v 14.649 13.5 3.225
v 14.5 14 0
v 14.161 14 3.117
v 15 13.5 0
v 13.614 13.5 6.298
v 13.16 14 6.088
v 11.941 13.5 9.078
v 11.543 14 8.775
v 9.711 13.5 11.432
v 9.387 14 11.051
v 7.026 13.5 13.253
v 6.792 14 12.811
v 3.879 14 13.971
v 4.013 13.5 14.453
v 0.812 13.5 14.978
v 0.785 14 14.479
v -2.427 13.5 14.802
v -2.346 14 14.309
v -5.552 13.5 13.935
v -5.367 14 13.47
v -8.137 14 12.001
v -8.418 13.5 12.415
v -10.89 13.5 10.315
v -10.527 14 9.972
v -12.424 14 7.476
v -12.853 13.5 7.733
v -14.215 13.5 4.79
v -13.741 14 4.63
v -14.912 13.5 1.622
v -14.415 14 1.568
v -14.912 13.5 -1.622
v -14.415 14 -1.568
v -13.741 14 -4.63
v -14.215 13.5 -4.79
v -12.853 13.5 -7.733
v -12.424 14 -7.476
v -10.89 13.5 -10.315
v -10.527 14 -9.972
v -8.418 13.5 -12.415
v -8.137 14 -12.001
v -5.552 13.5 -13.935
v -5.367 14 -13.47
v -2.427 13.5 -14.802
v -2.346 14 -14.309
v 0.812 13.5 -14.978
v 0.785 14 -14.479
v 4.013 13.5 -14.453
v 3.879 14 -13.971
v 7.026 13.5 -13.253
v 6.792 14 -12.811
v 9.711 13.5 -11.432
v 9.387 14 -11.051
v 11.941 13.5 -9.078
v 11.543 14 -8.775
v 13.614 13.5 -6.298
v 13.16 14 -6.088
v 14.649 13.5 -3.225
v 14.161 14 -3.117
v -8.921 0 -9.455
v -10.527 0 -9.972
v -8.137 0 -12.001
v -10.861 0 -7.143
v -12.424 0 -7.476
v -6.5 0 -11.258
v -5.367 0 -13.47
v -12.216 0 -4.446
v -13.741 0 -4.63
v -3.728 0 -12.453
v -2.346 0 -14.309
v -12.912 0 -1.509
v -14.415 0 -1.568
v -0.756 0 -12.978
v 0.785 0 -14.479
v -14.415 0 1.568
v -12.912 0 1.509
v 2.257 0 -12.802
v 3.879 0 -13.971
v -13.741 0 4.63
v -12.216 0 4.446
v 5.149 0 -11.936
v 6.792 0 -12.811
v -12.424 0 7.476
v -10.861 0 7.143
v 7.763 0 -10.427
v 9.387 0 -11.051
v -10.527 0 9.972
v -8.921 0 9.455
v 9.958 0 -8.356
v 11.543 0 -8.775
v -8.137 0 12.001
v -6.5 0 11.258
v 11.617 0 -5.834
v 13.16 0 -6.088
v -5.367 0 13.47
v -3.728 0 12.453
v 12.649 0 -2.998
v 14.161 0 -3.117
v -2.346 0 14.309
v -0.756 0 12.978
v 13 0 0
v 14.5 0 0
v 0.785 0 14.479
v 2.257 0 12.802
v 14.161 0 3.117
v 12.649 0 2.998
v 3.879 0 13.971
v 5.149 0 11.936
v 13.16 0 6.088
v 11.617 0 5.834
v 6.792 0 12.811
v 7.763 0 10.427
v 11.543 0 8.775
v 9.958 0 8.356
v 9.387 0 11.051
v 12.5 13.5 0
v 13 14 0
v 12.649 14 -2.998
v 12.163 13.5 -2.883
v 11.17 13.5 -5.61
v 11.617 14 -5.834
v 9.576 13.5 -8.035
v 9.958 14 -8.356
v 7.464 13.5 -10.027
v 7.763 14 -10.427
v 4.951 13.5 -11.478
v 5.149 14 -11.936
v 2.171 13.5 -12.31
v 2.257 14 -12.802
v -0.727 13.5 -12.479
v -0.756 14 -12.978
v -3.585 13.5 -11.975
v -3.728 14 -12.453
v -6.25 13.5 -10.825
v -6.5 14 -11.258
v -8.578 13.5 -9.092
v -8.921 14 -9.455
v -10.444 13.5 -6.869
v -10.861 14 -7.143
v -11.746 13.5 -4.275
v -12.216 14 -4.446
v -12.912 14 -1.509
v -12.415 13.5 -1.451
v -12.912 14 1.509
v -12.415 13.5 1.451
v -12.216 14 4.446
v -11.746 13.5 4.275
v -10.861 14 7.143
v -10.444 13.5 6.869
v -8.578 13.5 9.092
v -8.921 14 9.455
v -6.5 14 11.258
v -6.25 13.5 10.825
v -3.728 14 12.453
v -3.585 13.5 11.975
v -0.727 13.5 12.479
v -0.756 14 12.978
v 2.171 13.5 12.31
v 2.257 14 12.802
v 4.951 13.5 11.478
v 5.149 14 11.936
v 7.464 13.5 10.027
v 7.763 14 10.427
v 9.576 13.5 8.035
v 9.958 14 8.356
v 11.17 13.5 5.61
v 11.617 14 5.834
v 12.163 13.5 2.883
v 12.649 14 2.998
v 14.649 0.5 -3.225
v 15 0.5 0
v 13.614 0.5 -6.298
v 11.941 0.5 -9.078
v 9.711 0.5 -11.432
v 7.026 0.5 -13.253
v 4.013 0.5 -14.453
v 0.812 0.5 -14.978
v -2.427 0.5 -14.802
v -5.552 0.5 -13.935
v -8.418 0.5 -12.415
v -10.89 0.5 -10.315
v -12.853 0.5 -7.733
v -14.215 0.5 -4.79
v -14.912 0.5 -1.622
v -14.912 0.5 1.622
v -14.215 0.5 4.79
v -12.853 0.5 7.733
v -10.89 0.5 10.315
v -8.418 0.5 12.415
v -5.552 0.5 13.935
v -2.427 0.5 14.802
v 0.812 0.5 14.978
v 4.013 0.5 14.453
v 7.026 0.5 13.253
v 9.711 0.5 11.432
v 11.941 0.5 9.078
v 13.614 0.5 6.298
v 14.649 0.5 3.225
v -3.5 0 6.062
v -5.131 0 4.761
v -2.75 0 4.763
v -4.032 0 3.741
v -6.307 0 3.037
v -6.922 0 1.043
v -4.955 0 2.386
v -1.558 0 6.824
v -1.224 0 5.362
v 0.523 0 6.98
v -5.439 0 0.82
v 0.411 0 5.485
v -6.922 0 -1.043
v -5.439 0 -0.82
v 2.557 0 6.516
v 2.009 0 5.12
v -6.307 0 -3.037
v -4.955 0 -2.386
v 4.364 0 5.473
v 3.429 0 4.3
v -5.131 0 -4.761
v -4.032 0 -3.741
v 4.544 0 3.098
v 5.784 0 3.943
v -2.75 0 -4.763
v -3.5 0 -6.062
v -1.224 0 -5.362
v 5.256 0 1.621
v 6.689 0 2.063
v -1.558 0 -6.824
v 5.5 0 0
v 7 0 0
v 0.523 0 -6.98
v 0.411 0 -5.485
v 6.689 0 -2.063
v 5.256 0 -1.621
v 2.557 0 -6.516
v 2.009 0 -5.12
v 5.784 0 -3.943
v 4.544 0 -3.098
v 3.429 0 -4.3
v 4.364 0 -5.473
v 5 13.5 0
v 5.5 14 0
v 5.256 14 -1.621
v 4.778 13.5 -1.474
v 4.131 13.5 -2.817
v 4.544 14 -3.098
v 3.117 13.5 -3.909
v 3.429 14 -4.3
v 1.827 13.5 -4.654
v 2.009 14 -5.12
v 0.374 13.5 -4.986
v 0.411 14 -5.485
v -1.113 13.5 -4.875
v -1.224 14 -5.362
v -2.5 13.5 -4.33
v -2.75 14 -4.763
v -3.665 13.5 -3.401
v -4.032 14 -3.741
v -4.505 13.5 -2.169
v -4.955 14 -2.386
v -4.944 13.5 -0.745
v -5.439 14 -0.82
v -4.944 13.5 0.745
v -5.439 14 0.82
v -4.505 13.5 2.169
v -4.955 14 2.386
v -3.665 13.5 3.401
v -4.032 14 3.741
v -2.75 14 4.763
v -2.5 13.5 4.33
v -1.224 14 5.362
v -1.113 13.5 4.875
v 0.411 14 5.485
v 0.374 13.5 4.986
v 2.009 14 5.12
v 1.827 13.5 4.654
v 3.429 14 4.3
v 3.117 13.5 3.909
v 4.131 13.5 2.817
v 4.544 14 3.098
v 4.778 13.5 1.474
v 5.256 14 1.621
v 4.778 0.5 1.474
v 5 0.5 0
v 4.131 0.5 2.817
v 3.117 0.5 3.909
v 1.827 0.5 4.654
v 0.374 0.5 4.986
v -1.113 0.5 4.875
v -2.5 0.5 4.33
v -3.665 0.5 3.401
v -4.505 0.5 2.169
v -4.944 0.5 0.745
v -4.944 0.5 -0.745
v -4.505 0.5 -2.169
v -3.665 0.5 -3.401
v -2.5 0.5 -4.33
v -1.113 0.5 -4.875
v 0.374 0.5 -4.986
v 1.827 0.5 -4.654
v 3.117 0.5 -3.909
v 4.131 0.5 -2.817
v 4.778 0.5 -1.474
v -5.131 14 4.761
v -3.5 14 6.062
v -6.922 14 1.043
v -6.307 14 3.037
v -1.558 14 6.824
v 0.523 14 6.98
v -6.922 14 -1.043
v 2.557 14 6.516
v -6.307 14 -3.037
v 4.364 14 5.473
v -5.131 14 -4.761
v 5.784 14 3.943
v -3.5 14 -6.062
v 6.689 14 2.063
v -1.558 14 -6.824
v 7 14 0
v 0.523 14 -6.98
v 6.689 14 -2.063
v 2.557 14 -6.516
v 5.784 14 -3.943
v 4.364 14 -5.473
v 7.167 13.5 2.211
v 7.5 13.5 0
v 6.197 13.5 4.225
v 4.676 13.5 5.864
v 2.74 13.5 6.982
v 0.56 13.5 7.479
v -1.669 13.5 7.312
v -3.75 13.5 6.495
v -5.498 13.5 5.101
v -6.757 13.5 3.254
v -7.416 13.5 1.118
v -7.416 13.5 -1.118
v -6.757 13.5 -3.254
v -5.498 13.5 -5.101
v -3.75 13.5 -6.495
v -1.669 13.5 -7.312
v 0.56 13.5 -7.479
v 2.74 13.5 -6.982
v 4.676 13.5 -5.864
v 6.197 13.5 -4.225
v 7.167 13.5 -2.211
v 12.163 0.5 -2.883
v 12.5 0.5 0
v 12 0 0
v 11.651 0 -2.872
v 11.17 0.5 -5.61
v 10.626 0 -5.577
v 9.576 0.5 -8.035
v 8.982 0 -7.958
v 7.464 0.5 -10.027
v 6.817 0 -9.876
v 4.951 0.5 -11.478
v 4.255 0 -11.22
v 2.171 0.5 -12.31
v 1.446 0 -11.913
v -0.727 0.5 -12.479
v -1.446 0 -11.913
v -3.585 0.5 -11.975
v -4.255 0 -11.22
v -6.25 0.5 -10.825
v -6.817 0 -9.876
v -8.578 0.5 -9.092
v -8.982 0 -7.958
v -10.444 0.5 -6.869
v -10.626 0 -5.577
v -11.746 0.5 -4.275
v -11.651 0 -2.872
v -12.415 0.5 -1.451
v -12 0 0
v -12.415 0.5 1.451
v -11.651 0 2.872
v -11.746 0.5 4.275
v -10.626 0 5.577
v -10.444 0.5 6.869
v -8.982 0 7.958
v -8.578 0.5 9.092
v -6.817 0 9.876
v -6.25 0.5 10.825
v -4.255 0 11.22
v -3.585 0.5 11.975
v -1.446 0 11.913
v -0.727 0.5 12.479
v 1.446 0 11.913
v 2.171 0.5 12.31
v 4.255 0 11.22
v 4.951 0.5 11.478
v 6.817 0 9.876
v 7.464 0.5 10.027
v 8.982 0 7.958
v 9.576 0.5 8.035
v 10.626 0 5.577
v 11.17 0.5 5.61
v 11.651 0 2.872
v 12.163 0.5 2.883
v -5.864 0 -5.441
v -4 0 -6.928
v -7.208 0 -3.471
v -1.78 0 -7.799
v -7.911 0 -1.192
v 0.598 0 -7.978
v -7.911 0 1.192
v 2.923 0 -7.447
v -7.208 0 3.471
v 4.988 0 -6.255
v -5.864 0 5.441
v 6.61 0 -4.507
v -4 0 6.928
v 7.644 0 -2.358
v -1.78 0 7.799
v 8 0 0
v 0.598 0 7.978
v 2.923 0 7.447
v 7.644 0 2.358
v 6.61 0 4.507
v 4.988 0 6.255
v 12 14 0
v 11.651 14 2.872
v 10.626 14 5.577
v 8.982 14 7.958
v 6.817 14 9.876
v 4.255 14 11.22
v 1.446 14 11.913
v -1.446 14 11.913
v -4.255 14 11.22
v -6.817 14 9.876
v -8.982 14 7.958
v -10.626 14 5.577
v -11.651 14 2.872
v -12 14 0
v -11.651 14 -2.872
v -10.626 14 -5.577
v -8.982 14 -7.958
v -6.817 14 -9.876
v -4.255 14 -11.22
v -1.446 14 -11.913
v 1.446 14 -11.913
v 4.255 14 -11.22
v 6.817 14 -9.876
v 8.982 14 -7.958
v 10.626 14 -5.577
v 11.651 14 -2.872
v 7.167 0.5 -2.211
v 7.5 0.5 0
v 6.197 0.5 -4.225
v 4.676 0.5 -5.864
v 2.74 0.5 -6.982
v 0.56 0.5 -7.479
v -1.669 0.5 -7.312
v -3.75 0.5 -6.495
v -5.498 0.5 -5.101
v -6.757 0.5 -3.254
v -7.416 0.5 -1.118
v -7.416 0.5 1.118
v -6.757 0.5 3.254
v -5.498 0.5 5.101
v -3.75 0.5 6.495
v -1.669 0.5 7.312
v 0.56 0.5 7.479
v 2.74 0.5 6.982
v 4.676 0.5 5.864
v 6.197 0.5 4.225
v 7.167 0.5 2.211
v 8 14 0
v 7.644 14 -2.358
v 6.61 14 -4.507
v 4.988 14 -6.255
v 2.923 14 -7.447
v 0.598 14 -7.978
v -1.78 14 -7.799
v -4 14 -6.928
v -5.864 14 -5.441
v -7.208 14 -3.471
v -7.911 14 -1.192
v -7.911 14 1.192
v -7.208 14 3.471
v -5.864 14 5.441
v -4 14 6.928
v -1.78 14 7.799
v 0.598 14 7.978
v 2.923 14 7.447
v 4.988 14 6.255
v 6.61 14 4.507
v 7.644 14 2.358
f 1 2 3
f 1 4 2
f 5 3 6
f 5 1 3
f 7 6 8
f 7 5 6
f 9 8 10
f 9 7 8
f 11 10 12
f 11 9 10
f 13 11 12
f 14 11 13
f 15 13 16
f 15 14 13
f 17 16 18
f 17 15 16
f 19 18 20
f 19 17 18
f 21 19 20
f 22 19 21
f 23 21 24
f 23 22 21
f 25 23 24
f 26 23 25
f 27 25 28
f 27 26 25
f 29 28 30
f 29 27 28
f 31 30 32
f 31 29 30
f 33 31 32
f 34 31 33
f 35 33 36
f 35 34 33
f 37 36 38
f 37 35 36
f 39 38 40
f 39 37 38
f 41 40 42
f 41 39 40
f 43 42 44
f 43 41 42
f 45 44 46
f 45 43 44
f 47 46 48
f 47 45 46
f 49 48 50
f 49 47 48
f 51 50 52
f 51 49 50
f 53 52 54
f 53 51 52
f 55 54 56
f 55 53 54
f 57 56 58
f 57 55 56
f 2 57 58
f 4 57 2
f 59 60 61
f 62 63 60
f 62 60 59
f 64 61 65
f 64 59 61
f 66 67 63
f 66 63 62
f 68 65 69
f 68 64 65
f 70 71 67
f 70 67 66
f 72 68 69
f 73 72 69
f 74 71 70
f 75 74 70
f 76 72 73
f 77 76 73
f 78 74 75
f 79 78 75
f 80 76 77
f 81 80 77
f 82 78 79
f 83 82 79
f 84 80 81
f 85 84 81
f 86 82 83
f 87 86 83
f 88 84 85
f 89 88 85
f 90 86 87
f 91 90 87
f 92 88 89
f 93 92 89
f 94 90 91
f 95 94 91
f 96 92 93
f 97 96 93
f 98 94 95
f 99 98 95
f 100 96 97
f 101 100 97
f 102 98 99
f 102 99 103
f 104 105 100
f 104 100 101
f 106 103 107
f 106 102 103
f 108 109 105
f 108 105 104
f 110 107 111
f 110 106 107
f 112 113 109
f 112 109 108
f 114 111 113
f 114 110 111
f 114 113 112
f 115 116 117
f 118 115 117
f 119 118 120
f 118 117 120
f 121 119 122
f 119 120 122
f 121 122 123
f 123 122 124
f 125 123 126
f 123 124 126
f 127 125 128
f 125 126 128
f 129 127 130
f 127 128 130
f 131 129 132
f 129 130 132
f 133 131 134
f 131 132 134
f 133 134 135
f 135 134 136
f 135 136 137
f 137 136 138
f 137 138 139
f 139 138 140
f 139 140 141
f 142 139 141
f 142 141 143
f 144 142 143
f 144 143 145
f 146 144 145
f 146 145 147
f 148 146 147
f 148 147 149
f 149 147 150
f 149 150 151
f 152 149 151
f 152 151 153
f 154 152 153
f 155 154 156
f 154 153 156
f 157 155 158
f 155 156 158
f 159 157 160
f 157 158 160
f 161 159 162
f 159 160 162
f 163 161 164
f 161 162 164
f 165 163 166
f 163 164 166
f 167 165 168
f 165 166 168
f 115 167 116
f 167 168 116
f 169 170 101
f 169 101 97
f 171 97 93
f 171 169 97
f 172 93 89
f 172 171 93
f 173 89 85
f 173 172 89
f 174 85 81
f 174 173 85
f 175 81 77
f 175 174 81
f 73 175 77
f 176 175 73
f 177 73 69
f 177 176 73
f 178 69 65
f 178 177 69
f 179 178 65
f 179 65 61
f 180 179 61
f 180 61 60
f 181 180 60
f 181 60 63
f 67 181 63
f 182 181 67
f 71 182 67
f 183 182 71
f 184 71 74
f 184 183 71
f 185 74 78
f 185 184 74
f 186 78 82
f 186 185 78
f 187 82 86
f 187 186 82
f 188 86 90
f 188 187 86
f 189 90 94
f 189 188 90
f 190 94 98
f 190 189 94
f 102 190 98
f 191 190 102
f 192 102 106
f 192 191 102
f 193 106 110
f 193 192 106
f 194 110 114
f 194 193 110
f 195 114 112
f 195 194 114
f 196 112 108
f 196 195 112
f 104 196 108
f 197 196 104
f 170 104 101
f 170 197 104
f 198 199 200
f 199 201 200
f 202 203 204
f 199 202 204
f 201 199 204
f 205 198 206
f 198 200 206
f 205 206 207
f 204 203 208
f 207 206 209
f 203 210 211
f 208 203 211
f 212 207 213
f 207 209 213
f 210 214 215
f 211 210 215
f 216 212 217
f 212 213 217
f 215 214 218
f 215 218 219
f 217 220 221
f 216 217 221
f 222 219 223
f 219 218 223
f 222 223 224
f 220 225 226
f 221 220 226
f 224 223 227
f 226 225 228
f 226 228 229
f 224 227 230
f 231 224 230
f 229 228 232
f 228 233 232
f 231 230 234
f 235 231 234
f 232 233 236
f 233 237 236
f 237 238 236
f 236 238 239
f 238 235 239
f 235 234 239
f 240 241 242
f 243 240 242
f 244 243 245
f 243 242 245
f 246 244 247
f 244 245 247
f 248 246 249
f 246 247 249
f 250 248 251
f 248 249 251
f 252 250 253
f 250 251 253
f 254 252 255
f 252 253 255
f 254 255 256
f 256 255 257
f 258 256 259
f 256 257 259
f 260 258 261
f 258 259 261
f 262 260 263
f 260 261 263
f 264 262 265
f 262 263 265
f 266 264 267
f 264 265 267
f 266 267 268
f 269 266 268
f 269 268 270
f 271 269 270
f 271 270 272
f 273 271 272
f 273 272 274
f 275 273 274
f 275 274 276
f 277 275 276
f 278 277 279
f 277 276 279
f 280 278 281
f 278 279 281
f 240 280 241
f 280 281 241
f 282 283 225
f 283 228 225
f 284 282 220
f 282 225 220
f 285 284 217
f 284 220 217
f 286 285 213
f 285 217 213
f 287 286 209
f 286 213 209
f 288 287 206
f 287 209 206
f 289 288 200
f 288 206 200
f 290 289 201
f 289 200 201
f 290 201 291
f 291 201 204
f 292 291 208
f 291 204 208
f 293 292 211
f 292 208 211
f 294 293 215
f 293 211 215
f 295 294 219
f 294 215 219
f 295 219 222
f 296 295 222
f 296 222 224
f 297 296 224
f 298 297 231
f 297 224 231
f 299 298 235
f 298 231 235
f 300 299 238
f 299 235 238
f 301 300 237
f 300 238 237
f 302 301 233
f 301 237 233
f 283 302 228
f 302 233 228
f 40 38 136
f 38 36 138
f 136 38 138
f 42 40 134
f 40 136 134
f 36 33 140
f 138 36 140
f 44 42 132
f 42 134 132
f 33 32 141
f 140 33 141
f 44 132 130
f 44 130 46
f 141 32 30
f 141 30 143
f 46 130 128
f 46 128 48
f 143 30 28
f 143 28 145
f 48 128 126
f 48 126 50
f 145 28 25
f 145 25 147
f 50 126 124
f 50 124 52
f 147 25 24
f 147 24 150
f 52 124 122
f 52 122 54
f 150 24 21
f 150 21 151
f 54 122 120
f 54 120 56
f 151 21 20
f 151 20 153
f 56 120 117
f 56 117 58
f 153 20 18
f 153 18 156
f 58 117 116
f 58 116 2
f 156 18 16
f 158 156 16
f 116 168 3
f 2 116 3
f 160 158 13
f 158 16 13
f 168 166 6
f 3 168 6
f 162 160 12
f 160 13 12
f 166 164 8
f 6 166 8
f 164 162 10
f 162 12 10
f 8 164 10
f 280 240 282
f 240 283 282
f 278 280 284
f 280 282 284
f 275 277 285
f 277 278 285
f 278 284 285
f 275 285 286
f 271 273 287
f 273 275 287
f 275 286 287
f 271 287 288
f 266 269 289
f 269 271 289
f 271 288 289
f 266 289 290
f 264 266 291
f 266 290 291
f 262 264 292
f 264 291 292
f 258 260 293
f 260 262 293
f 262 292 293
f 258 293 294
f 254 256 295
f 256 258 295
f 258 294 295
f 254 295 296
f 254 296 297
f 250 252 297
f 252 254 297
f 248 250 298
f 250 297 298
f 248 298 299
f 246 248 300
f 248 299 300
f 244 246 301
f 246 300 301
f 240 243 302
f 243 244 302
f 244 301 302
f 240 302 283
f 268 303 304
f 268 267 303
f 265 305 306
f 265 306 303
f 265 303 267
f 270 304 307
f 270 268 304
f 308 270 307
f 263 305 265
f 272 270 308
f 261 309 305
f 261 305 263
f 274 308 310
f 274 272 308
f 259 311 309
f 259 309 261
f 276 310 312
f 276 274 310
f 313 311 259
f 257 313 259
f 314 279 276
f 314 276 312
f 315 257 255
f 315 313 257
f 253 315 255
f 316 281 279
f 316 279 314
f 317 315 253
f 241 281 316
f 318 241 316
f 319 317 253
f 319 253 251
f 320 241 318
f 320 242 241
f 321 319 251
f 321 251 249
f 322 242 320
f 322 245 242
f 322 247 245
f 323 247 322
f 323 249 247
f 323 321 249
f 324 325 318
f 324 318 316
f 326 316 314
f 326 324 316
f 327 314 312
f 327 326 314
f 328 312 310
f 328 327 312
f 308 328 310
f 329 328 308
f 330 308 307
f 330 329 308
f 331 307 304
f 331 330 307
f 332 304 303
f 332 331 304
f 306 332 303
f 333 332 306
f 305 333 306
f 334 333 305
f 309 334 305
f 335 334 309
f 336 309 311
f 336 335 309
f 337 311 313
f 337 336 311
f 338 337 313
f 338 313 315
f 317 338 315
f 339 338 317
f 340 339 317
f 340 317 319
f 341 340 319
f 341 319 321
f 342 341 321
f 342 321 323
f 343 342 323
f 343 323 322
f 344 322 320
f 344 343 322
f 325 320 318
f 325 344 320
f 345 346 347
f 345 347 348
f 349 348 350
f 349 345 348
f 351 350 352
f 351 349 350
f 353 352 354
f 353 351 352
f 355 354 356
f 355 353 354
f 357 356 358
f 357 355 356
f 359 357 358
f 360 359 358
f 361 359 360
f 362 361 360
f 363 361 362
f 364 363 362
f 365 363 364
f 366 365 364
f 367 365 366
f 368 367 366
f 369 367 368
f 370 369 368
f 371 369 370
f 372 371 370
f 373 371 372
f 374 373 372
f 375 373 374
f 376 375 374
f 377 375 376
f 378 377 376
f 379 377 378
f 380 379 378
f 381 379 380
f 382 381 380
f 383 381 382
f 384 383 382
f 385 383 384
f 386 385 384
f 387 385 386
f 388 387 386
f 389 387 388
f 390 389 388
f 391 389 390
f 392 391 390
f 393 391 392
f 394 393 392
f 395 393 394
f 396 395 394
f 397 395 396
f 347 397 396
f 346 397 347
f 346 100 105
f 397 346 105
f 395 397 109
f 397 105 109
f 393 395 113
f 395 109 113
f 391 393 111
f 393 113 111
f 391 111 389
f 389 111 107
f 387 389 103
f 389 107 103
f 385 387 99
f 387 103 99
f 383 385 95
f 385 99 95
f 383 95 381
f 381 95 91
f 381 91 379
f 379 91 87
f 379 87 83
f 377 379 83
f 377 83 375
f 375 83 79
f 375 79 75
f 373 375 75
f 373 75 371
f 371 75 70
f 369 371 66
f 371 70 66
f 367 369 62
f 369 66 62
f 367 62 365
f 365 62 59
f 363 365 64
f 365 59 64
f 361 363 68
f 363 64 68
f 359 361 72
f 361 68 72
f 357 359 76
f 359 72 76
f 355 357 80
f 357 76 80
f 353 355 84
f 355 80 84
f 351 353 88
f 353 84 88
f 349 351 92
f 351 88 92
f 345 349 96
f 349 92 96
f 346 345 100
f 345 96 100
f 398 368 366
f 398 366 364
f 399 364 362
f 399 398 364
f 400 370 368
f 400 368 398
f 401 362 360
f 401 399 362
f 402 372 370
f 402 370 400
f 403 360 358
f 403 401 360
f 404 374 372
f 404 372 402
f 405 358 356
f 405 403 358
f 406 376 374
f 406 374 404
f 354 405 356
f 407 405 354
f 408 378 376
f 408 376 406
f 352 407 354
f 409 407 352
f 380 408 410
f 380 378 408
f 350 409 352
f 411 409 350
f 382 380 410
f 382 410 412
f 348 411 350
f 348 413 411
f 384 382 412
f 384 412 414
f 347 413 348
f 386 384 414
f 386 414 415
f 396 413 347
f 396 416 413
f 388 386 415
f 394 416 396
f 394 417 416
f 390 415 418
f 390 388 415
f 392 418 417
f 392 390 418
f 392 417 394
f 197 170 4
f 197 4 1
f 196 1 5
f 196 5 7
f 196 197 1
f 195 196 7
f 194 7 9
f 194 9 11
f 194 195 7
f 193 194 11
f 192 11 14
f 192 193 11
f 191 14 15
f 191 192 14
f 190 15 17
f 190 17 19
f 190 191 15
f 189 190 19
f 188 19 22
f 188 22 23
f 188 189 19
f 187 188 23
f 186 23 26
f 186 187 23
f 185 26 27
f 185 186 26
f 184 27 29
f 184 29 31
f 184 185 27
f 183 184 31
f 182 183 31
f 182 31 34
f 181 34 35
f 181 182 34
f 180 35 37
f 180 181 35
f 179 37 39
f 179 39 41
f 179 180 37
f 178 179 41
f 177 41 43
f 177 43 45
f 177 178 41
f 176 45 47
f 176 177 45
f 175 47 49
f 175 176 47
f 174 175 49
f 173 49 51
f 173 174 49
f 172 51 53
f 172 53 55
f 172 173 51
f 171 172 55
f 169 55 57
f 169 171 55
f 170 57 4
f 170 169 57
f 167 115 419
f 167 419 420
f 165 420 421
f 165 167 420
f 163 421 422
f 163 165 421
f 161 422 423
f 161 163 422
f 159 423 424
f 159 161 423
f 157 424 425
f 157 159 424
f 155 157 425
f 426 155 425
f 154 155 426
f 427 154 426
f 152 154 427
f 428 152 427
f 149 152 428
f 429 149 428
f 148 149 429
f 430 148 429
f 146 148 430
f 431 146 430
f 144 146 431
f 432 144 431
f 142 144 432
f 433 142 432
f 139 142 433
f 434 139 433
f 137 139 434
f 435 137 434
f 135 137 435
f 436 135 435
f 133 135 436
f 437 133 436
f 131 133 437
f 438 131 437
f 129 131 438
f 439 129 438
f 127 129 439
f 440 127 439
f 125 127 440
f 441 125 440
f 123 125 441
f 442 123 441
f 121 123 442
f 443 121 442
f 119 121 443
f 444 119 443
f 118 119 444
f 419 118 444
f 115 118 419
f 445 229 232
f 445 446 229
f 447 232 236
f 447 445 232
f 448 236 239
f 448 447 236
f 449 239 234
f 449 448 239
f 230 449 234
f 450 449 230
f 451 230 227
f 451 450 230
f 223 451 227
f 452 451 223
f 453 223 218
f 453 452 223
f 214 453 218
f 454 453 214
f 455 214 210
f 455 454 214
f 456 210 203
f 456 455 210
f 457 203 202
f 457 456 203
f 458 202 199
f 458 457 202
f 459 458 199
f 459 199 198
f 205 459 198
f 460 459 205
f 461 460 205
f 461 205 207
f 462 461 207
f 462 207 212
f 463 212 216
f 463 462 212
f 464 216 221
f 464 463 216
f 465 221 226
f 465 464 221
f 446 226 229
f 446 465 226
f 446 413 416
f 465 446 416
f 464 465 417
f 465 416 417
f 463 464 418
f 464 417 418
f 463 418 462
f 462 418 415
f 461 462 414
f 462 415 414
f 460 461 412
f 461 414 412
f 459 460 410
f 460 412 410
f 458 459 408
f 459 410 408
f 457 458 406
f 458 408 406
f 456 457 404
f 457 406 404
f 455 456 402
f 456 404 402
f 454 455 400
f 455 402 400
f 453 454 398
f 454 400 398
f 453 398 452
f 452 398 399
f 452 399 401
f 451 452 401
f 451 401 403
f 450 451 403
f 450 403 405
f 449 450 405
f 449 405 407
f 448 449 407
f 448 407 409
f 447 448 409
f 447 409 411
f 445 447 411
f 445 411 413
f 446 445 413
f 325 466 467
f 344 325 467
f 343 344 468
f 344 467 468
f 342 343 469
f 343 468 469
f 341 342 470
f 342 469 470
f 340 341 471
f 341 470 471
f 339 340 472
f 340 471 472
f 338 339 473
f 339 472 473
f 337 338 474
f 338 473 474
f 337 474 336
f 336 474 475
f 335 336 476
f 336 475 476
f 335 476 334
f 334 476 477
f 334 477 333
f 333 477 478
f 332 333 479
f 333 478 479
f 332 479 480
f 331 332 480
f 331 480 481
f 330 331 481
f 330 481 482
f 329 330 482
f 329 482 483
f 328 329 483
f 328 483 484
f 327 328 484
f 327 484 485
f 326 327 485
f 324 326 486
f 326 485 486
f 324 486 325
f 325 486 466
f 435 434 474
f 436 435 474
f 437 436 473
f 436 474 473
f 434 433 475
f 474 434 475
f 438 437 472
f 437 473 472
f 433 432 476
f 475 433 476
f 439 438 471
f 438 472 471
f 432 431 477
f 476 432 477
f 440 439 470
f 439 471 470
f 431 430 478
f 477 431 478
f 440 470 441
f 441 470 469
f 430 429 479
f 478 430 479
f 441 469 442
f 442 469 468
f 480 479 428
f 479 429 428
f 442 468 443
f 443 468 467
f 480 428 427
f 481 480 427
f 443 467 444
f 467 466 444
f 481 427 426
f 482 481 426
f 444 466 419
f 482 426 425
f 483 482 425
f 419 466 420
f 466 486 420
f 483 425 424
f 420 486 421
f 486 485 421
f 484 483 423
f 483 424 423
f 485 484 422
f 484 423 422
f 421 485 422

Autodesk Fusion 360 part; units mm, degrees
sketch "Sketch1" plane through (0, 0, 0) normal (0, 1, 0) x (1, 0, 0)
  circle A0 centre (0, 0) radius 5
  circle A1 centre (0, 0) radius 7.5
  dimension "d1" = 10
  dimension "d2" = 15
extrude "Extrude1" add sketch "Sketch1" along normal blind 14
sketch "Sketch2" plane through (0, 0, 0) normal (0, -1, 0) x (1, 0, 0)
  circle A0 centre (0, 0) radius 5
  circle A1 centre (0, 0) radius 7.5
  circle A2 centre (0, 0) radius 7.5
  circle A3 centre (0, 0) radius 12.5
  dimension "d5" = 25
chamfer "Chamfer1" distance 0.5 angle 45 2 edges at (-6.9925, 0, 2.7121) (-6.9925, 14, 2.7121)
extrude "Extrude2" add sketch "Sketch2" against normal blind 14 contours A3
chamfer "Chamfer2" distance 0.5 angle 45 4 edges at (-6.9925, 0, 2.7121) (-6.9925, 14, -2.7121) (-11.6541, 14, 4.5202) (-11.6541, 0, -4.5202)
sketch "Sketch3" plane through (0, 0, 0) normal (0, -1, 0) x (1, 0, 0)
  circle A0 centre (0, 0) radius 8
  circle A1 centre (0, 0) radius 12
  circle A2 centre (0, 0) radius 12.5
  circle A3 centre (0, 0) radius 15
  dimension "d10" = 25
  dimension "d11" = 30
extrude "Extrude3" add sketch "Sketch3" against normal blind 14 contours A3
chamfer "Chamfer3" distance 0.5 angle 45 2 edges at (-11.6541, 0, 4.5202) (-11.6541, 14, -4.5202)
chamfer "Chamfer4" distance 0.5 angle 45 4 edges at (-13.9849, 14, 5.4242) (-13.9849, 0, -5.4242) (-4.6616, 0, -1.8081) (-4.6616, 14, -1.8081)
